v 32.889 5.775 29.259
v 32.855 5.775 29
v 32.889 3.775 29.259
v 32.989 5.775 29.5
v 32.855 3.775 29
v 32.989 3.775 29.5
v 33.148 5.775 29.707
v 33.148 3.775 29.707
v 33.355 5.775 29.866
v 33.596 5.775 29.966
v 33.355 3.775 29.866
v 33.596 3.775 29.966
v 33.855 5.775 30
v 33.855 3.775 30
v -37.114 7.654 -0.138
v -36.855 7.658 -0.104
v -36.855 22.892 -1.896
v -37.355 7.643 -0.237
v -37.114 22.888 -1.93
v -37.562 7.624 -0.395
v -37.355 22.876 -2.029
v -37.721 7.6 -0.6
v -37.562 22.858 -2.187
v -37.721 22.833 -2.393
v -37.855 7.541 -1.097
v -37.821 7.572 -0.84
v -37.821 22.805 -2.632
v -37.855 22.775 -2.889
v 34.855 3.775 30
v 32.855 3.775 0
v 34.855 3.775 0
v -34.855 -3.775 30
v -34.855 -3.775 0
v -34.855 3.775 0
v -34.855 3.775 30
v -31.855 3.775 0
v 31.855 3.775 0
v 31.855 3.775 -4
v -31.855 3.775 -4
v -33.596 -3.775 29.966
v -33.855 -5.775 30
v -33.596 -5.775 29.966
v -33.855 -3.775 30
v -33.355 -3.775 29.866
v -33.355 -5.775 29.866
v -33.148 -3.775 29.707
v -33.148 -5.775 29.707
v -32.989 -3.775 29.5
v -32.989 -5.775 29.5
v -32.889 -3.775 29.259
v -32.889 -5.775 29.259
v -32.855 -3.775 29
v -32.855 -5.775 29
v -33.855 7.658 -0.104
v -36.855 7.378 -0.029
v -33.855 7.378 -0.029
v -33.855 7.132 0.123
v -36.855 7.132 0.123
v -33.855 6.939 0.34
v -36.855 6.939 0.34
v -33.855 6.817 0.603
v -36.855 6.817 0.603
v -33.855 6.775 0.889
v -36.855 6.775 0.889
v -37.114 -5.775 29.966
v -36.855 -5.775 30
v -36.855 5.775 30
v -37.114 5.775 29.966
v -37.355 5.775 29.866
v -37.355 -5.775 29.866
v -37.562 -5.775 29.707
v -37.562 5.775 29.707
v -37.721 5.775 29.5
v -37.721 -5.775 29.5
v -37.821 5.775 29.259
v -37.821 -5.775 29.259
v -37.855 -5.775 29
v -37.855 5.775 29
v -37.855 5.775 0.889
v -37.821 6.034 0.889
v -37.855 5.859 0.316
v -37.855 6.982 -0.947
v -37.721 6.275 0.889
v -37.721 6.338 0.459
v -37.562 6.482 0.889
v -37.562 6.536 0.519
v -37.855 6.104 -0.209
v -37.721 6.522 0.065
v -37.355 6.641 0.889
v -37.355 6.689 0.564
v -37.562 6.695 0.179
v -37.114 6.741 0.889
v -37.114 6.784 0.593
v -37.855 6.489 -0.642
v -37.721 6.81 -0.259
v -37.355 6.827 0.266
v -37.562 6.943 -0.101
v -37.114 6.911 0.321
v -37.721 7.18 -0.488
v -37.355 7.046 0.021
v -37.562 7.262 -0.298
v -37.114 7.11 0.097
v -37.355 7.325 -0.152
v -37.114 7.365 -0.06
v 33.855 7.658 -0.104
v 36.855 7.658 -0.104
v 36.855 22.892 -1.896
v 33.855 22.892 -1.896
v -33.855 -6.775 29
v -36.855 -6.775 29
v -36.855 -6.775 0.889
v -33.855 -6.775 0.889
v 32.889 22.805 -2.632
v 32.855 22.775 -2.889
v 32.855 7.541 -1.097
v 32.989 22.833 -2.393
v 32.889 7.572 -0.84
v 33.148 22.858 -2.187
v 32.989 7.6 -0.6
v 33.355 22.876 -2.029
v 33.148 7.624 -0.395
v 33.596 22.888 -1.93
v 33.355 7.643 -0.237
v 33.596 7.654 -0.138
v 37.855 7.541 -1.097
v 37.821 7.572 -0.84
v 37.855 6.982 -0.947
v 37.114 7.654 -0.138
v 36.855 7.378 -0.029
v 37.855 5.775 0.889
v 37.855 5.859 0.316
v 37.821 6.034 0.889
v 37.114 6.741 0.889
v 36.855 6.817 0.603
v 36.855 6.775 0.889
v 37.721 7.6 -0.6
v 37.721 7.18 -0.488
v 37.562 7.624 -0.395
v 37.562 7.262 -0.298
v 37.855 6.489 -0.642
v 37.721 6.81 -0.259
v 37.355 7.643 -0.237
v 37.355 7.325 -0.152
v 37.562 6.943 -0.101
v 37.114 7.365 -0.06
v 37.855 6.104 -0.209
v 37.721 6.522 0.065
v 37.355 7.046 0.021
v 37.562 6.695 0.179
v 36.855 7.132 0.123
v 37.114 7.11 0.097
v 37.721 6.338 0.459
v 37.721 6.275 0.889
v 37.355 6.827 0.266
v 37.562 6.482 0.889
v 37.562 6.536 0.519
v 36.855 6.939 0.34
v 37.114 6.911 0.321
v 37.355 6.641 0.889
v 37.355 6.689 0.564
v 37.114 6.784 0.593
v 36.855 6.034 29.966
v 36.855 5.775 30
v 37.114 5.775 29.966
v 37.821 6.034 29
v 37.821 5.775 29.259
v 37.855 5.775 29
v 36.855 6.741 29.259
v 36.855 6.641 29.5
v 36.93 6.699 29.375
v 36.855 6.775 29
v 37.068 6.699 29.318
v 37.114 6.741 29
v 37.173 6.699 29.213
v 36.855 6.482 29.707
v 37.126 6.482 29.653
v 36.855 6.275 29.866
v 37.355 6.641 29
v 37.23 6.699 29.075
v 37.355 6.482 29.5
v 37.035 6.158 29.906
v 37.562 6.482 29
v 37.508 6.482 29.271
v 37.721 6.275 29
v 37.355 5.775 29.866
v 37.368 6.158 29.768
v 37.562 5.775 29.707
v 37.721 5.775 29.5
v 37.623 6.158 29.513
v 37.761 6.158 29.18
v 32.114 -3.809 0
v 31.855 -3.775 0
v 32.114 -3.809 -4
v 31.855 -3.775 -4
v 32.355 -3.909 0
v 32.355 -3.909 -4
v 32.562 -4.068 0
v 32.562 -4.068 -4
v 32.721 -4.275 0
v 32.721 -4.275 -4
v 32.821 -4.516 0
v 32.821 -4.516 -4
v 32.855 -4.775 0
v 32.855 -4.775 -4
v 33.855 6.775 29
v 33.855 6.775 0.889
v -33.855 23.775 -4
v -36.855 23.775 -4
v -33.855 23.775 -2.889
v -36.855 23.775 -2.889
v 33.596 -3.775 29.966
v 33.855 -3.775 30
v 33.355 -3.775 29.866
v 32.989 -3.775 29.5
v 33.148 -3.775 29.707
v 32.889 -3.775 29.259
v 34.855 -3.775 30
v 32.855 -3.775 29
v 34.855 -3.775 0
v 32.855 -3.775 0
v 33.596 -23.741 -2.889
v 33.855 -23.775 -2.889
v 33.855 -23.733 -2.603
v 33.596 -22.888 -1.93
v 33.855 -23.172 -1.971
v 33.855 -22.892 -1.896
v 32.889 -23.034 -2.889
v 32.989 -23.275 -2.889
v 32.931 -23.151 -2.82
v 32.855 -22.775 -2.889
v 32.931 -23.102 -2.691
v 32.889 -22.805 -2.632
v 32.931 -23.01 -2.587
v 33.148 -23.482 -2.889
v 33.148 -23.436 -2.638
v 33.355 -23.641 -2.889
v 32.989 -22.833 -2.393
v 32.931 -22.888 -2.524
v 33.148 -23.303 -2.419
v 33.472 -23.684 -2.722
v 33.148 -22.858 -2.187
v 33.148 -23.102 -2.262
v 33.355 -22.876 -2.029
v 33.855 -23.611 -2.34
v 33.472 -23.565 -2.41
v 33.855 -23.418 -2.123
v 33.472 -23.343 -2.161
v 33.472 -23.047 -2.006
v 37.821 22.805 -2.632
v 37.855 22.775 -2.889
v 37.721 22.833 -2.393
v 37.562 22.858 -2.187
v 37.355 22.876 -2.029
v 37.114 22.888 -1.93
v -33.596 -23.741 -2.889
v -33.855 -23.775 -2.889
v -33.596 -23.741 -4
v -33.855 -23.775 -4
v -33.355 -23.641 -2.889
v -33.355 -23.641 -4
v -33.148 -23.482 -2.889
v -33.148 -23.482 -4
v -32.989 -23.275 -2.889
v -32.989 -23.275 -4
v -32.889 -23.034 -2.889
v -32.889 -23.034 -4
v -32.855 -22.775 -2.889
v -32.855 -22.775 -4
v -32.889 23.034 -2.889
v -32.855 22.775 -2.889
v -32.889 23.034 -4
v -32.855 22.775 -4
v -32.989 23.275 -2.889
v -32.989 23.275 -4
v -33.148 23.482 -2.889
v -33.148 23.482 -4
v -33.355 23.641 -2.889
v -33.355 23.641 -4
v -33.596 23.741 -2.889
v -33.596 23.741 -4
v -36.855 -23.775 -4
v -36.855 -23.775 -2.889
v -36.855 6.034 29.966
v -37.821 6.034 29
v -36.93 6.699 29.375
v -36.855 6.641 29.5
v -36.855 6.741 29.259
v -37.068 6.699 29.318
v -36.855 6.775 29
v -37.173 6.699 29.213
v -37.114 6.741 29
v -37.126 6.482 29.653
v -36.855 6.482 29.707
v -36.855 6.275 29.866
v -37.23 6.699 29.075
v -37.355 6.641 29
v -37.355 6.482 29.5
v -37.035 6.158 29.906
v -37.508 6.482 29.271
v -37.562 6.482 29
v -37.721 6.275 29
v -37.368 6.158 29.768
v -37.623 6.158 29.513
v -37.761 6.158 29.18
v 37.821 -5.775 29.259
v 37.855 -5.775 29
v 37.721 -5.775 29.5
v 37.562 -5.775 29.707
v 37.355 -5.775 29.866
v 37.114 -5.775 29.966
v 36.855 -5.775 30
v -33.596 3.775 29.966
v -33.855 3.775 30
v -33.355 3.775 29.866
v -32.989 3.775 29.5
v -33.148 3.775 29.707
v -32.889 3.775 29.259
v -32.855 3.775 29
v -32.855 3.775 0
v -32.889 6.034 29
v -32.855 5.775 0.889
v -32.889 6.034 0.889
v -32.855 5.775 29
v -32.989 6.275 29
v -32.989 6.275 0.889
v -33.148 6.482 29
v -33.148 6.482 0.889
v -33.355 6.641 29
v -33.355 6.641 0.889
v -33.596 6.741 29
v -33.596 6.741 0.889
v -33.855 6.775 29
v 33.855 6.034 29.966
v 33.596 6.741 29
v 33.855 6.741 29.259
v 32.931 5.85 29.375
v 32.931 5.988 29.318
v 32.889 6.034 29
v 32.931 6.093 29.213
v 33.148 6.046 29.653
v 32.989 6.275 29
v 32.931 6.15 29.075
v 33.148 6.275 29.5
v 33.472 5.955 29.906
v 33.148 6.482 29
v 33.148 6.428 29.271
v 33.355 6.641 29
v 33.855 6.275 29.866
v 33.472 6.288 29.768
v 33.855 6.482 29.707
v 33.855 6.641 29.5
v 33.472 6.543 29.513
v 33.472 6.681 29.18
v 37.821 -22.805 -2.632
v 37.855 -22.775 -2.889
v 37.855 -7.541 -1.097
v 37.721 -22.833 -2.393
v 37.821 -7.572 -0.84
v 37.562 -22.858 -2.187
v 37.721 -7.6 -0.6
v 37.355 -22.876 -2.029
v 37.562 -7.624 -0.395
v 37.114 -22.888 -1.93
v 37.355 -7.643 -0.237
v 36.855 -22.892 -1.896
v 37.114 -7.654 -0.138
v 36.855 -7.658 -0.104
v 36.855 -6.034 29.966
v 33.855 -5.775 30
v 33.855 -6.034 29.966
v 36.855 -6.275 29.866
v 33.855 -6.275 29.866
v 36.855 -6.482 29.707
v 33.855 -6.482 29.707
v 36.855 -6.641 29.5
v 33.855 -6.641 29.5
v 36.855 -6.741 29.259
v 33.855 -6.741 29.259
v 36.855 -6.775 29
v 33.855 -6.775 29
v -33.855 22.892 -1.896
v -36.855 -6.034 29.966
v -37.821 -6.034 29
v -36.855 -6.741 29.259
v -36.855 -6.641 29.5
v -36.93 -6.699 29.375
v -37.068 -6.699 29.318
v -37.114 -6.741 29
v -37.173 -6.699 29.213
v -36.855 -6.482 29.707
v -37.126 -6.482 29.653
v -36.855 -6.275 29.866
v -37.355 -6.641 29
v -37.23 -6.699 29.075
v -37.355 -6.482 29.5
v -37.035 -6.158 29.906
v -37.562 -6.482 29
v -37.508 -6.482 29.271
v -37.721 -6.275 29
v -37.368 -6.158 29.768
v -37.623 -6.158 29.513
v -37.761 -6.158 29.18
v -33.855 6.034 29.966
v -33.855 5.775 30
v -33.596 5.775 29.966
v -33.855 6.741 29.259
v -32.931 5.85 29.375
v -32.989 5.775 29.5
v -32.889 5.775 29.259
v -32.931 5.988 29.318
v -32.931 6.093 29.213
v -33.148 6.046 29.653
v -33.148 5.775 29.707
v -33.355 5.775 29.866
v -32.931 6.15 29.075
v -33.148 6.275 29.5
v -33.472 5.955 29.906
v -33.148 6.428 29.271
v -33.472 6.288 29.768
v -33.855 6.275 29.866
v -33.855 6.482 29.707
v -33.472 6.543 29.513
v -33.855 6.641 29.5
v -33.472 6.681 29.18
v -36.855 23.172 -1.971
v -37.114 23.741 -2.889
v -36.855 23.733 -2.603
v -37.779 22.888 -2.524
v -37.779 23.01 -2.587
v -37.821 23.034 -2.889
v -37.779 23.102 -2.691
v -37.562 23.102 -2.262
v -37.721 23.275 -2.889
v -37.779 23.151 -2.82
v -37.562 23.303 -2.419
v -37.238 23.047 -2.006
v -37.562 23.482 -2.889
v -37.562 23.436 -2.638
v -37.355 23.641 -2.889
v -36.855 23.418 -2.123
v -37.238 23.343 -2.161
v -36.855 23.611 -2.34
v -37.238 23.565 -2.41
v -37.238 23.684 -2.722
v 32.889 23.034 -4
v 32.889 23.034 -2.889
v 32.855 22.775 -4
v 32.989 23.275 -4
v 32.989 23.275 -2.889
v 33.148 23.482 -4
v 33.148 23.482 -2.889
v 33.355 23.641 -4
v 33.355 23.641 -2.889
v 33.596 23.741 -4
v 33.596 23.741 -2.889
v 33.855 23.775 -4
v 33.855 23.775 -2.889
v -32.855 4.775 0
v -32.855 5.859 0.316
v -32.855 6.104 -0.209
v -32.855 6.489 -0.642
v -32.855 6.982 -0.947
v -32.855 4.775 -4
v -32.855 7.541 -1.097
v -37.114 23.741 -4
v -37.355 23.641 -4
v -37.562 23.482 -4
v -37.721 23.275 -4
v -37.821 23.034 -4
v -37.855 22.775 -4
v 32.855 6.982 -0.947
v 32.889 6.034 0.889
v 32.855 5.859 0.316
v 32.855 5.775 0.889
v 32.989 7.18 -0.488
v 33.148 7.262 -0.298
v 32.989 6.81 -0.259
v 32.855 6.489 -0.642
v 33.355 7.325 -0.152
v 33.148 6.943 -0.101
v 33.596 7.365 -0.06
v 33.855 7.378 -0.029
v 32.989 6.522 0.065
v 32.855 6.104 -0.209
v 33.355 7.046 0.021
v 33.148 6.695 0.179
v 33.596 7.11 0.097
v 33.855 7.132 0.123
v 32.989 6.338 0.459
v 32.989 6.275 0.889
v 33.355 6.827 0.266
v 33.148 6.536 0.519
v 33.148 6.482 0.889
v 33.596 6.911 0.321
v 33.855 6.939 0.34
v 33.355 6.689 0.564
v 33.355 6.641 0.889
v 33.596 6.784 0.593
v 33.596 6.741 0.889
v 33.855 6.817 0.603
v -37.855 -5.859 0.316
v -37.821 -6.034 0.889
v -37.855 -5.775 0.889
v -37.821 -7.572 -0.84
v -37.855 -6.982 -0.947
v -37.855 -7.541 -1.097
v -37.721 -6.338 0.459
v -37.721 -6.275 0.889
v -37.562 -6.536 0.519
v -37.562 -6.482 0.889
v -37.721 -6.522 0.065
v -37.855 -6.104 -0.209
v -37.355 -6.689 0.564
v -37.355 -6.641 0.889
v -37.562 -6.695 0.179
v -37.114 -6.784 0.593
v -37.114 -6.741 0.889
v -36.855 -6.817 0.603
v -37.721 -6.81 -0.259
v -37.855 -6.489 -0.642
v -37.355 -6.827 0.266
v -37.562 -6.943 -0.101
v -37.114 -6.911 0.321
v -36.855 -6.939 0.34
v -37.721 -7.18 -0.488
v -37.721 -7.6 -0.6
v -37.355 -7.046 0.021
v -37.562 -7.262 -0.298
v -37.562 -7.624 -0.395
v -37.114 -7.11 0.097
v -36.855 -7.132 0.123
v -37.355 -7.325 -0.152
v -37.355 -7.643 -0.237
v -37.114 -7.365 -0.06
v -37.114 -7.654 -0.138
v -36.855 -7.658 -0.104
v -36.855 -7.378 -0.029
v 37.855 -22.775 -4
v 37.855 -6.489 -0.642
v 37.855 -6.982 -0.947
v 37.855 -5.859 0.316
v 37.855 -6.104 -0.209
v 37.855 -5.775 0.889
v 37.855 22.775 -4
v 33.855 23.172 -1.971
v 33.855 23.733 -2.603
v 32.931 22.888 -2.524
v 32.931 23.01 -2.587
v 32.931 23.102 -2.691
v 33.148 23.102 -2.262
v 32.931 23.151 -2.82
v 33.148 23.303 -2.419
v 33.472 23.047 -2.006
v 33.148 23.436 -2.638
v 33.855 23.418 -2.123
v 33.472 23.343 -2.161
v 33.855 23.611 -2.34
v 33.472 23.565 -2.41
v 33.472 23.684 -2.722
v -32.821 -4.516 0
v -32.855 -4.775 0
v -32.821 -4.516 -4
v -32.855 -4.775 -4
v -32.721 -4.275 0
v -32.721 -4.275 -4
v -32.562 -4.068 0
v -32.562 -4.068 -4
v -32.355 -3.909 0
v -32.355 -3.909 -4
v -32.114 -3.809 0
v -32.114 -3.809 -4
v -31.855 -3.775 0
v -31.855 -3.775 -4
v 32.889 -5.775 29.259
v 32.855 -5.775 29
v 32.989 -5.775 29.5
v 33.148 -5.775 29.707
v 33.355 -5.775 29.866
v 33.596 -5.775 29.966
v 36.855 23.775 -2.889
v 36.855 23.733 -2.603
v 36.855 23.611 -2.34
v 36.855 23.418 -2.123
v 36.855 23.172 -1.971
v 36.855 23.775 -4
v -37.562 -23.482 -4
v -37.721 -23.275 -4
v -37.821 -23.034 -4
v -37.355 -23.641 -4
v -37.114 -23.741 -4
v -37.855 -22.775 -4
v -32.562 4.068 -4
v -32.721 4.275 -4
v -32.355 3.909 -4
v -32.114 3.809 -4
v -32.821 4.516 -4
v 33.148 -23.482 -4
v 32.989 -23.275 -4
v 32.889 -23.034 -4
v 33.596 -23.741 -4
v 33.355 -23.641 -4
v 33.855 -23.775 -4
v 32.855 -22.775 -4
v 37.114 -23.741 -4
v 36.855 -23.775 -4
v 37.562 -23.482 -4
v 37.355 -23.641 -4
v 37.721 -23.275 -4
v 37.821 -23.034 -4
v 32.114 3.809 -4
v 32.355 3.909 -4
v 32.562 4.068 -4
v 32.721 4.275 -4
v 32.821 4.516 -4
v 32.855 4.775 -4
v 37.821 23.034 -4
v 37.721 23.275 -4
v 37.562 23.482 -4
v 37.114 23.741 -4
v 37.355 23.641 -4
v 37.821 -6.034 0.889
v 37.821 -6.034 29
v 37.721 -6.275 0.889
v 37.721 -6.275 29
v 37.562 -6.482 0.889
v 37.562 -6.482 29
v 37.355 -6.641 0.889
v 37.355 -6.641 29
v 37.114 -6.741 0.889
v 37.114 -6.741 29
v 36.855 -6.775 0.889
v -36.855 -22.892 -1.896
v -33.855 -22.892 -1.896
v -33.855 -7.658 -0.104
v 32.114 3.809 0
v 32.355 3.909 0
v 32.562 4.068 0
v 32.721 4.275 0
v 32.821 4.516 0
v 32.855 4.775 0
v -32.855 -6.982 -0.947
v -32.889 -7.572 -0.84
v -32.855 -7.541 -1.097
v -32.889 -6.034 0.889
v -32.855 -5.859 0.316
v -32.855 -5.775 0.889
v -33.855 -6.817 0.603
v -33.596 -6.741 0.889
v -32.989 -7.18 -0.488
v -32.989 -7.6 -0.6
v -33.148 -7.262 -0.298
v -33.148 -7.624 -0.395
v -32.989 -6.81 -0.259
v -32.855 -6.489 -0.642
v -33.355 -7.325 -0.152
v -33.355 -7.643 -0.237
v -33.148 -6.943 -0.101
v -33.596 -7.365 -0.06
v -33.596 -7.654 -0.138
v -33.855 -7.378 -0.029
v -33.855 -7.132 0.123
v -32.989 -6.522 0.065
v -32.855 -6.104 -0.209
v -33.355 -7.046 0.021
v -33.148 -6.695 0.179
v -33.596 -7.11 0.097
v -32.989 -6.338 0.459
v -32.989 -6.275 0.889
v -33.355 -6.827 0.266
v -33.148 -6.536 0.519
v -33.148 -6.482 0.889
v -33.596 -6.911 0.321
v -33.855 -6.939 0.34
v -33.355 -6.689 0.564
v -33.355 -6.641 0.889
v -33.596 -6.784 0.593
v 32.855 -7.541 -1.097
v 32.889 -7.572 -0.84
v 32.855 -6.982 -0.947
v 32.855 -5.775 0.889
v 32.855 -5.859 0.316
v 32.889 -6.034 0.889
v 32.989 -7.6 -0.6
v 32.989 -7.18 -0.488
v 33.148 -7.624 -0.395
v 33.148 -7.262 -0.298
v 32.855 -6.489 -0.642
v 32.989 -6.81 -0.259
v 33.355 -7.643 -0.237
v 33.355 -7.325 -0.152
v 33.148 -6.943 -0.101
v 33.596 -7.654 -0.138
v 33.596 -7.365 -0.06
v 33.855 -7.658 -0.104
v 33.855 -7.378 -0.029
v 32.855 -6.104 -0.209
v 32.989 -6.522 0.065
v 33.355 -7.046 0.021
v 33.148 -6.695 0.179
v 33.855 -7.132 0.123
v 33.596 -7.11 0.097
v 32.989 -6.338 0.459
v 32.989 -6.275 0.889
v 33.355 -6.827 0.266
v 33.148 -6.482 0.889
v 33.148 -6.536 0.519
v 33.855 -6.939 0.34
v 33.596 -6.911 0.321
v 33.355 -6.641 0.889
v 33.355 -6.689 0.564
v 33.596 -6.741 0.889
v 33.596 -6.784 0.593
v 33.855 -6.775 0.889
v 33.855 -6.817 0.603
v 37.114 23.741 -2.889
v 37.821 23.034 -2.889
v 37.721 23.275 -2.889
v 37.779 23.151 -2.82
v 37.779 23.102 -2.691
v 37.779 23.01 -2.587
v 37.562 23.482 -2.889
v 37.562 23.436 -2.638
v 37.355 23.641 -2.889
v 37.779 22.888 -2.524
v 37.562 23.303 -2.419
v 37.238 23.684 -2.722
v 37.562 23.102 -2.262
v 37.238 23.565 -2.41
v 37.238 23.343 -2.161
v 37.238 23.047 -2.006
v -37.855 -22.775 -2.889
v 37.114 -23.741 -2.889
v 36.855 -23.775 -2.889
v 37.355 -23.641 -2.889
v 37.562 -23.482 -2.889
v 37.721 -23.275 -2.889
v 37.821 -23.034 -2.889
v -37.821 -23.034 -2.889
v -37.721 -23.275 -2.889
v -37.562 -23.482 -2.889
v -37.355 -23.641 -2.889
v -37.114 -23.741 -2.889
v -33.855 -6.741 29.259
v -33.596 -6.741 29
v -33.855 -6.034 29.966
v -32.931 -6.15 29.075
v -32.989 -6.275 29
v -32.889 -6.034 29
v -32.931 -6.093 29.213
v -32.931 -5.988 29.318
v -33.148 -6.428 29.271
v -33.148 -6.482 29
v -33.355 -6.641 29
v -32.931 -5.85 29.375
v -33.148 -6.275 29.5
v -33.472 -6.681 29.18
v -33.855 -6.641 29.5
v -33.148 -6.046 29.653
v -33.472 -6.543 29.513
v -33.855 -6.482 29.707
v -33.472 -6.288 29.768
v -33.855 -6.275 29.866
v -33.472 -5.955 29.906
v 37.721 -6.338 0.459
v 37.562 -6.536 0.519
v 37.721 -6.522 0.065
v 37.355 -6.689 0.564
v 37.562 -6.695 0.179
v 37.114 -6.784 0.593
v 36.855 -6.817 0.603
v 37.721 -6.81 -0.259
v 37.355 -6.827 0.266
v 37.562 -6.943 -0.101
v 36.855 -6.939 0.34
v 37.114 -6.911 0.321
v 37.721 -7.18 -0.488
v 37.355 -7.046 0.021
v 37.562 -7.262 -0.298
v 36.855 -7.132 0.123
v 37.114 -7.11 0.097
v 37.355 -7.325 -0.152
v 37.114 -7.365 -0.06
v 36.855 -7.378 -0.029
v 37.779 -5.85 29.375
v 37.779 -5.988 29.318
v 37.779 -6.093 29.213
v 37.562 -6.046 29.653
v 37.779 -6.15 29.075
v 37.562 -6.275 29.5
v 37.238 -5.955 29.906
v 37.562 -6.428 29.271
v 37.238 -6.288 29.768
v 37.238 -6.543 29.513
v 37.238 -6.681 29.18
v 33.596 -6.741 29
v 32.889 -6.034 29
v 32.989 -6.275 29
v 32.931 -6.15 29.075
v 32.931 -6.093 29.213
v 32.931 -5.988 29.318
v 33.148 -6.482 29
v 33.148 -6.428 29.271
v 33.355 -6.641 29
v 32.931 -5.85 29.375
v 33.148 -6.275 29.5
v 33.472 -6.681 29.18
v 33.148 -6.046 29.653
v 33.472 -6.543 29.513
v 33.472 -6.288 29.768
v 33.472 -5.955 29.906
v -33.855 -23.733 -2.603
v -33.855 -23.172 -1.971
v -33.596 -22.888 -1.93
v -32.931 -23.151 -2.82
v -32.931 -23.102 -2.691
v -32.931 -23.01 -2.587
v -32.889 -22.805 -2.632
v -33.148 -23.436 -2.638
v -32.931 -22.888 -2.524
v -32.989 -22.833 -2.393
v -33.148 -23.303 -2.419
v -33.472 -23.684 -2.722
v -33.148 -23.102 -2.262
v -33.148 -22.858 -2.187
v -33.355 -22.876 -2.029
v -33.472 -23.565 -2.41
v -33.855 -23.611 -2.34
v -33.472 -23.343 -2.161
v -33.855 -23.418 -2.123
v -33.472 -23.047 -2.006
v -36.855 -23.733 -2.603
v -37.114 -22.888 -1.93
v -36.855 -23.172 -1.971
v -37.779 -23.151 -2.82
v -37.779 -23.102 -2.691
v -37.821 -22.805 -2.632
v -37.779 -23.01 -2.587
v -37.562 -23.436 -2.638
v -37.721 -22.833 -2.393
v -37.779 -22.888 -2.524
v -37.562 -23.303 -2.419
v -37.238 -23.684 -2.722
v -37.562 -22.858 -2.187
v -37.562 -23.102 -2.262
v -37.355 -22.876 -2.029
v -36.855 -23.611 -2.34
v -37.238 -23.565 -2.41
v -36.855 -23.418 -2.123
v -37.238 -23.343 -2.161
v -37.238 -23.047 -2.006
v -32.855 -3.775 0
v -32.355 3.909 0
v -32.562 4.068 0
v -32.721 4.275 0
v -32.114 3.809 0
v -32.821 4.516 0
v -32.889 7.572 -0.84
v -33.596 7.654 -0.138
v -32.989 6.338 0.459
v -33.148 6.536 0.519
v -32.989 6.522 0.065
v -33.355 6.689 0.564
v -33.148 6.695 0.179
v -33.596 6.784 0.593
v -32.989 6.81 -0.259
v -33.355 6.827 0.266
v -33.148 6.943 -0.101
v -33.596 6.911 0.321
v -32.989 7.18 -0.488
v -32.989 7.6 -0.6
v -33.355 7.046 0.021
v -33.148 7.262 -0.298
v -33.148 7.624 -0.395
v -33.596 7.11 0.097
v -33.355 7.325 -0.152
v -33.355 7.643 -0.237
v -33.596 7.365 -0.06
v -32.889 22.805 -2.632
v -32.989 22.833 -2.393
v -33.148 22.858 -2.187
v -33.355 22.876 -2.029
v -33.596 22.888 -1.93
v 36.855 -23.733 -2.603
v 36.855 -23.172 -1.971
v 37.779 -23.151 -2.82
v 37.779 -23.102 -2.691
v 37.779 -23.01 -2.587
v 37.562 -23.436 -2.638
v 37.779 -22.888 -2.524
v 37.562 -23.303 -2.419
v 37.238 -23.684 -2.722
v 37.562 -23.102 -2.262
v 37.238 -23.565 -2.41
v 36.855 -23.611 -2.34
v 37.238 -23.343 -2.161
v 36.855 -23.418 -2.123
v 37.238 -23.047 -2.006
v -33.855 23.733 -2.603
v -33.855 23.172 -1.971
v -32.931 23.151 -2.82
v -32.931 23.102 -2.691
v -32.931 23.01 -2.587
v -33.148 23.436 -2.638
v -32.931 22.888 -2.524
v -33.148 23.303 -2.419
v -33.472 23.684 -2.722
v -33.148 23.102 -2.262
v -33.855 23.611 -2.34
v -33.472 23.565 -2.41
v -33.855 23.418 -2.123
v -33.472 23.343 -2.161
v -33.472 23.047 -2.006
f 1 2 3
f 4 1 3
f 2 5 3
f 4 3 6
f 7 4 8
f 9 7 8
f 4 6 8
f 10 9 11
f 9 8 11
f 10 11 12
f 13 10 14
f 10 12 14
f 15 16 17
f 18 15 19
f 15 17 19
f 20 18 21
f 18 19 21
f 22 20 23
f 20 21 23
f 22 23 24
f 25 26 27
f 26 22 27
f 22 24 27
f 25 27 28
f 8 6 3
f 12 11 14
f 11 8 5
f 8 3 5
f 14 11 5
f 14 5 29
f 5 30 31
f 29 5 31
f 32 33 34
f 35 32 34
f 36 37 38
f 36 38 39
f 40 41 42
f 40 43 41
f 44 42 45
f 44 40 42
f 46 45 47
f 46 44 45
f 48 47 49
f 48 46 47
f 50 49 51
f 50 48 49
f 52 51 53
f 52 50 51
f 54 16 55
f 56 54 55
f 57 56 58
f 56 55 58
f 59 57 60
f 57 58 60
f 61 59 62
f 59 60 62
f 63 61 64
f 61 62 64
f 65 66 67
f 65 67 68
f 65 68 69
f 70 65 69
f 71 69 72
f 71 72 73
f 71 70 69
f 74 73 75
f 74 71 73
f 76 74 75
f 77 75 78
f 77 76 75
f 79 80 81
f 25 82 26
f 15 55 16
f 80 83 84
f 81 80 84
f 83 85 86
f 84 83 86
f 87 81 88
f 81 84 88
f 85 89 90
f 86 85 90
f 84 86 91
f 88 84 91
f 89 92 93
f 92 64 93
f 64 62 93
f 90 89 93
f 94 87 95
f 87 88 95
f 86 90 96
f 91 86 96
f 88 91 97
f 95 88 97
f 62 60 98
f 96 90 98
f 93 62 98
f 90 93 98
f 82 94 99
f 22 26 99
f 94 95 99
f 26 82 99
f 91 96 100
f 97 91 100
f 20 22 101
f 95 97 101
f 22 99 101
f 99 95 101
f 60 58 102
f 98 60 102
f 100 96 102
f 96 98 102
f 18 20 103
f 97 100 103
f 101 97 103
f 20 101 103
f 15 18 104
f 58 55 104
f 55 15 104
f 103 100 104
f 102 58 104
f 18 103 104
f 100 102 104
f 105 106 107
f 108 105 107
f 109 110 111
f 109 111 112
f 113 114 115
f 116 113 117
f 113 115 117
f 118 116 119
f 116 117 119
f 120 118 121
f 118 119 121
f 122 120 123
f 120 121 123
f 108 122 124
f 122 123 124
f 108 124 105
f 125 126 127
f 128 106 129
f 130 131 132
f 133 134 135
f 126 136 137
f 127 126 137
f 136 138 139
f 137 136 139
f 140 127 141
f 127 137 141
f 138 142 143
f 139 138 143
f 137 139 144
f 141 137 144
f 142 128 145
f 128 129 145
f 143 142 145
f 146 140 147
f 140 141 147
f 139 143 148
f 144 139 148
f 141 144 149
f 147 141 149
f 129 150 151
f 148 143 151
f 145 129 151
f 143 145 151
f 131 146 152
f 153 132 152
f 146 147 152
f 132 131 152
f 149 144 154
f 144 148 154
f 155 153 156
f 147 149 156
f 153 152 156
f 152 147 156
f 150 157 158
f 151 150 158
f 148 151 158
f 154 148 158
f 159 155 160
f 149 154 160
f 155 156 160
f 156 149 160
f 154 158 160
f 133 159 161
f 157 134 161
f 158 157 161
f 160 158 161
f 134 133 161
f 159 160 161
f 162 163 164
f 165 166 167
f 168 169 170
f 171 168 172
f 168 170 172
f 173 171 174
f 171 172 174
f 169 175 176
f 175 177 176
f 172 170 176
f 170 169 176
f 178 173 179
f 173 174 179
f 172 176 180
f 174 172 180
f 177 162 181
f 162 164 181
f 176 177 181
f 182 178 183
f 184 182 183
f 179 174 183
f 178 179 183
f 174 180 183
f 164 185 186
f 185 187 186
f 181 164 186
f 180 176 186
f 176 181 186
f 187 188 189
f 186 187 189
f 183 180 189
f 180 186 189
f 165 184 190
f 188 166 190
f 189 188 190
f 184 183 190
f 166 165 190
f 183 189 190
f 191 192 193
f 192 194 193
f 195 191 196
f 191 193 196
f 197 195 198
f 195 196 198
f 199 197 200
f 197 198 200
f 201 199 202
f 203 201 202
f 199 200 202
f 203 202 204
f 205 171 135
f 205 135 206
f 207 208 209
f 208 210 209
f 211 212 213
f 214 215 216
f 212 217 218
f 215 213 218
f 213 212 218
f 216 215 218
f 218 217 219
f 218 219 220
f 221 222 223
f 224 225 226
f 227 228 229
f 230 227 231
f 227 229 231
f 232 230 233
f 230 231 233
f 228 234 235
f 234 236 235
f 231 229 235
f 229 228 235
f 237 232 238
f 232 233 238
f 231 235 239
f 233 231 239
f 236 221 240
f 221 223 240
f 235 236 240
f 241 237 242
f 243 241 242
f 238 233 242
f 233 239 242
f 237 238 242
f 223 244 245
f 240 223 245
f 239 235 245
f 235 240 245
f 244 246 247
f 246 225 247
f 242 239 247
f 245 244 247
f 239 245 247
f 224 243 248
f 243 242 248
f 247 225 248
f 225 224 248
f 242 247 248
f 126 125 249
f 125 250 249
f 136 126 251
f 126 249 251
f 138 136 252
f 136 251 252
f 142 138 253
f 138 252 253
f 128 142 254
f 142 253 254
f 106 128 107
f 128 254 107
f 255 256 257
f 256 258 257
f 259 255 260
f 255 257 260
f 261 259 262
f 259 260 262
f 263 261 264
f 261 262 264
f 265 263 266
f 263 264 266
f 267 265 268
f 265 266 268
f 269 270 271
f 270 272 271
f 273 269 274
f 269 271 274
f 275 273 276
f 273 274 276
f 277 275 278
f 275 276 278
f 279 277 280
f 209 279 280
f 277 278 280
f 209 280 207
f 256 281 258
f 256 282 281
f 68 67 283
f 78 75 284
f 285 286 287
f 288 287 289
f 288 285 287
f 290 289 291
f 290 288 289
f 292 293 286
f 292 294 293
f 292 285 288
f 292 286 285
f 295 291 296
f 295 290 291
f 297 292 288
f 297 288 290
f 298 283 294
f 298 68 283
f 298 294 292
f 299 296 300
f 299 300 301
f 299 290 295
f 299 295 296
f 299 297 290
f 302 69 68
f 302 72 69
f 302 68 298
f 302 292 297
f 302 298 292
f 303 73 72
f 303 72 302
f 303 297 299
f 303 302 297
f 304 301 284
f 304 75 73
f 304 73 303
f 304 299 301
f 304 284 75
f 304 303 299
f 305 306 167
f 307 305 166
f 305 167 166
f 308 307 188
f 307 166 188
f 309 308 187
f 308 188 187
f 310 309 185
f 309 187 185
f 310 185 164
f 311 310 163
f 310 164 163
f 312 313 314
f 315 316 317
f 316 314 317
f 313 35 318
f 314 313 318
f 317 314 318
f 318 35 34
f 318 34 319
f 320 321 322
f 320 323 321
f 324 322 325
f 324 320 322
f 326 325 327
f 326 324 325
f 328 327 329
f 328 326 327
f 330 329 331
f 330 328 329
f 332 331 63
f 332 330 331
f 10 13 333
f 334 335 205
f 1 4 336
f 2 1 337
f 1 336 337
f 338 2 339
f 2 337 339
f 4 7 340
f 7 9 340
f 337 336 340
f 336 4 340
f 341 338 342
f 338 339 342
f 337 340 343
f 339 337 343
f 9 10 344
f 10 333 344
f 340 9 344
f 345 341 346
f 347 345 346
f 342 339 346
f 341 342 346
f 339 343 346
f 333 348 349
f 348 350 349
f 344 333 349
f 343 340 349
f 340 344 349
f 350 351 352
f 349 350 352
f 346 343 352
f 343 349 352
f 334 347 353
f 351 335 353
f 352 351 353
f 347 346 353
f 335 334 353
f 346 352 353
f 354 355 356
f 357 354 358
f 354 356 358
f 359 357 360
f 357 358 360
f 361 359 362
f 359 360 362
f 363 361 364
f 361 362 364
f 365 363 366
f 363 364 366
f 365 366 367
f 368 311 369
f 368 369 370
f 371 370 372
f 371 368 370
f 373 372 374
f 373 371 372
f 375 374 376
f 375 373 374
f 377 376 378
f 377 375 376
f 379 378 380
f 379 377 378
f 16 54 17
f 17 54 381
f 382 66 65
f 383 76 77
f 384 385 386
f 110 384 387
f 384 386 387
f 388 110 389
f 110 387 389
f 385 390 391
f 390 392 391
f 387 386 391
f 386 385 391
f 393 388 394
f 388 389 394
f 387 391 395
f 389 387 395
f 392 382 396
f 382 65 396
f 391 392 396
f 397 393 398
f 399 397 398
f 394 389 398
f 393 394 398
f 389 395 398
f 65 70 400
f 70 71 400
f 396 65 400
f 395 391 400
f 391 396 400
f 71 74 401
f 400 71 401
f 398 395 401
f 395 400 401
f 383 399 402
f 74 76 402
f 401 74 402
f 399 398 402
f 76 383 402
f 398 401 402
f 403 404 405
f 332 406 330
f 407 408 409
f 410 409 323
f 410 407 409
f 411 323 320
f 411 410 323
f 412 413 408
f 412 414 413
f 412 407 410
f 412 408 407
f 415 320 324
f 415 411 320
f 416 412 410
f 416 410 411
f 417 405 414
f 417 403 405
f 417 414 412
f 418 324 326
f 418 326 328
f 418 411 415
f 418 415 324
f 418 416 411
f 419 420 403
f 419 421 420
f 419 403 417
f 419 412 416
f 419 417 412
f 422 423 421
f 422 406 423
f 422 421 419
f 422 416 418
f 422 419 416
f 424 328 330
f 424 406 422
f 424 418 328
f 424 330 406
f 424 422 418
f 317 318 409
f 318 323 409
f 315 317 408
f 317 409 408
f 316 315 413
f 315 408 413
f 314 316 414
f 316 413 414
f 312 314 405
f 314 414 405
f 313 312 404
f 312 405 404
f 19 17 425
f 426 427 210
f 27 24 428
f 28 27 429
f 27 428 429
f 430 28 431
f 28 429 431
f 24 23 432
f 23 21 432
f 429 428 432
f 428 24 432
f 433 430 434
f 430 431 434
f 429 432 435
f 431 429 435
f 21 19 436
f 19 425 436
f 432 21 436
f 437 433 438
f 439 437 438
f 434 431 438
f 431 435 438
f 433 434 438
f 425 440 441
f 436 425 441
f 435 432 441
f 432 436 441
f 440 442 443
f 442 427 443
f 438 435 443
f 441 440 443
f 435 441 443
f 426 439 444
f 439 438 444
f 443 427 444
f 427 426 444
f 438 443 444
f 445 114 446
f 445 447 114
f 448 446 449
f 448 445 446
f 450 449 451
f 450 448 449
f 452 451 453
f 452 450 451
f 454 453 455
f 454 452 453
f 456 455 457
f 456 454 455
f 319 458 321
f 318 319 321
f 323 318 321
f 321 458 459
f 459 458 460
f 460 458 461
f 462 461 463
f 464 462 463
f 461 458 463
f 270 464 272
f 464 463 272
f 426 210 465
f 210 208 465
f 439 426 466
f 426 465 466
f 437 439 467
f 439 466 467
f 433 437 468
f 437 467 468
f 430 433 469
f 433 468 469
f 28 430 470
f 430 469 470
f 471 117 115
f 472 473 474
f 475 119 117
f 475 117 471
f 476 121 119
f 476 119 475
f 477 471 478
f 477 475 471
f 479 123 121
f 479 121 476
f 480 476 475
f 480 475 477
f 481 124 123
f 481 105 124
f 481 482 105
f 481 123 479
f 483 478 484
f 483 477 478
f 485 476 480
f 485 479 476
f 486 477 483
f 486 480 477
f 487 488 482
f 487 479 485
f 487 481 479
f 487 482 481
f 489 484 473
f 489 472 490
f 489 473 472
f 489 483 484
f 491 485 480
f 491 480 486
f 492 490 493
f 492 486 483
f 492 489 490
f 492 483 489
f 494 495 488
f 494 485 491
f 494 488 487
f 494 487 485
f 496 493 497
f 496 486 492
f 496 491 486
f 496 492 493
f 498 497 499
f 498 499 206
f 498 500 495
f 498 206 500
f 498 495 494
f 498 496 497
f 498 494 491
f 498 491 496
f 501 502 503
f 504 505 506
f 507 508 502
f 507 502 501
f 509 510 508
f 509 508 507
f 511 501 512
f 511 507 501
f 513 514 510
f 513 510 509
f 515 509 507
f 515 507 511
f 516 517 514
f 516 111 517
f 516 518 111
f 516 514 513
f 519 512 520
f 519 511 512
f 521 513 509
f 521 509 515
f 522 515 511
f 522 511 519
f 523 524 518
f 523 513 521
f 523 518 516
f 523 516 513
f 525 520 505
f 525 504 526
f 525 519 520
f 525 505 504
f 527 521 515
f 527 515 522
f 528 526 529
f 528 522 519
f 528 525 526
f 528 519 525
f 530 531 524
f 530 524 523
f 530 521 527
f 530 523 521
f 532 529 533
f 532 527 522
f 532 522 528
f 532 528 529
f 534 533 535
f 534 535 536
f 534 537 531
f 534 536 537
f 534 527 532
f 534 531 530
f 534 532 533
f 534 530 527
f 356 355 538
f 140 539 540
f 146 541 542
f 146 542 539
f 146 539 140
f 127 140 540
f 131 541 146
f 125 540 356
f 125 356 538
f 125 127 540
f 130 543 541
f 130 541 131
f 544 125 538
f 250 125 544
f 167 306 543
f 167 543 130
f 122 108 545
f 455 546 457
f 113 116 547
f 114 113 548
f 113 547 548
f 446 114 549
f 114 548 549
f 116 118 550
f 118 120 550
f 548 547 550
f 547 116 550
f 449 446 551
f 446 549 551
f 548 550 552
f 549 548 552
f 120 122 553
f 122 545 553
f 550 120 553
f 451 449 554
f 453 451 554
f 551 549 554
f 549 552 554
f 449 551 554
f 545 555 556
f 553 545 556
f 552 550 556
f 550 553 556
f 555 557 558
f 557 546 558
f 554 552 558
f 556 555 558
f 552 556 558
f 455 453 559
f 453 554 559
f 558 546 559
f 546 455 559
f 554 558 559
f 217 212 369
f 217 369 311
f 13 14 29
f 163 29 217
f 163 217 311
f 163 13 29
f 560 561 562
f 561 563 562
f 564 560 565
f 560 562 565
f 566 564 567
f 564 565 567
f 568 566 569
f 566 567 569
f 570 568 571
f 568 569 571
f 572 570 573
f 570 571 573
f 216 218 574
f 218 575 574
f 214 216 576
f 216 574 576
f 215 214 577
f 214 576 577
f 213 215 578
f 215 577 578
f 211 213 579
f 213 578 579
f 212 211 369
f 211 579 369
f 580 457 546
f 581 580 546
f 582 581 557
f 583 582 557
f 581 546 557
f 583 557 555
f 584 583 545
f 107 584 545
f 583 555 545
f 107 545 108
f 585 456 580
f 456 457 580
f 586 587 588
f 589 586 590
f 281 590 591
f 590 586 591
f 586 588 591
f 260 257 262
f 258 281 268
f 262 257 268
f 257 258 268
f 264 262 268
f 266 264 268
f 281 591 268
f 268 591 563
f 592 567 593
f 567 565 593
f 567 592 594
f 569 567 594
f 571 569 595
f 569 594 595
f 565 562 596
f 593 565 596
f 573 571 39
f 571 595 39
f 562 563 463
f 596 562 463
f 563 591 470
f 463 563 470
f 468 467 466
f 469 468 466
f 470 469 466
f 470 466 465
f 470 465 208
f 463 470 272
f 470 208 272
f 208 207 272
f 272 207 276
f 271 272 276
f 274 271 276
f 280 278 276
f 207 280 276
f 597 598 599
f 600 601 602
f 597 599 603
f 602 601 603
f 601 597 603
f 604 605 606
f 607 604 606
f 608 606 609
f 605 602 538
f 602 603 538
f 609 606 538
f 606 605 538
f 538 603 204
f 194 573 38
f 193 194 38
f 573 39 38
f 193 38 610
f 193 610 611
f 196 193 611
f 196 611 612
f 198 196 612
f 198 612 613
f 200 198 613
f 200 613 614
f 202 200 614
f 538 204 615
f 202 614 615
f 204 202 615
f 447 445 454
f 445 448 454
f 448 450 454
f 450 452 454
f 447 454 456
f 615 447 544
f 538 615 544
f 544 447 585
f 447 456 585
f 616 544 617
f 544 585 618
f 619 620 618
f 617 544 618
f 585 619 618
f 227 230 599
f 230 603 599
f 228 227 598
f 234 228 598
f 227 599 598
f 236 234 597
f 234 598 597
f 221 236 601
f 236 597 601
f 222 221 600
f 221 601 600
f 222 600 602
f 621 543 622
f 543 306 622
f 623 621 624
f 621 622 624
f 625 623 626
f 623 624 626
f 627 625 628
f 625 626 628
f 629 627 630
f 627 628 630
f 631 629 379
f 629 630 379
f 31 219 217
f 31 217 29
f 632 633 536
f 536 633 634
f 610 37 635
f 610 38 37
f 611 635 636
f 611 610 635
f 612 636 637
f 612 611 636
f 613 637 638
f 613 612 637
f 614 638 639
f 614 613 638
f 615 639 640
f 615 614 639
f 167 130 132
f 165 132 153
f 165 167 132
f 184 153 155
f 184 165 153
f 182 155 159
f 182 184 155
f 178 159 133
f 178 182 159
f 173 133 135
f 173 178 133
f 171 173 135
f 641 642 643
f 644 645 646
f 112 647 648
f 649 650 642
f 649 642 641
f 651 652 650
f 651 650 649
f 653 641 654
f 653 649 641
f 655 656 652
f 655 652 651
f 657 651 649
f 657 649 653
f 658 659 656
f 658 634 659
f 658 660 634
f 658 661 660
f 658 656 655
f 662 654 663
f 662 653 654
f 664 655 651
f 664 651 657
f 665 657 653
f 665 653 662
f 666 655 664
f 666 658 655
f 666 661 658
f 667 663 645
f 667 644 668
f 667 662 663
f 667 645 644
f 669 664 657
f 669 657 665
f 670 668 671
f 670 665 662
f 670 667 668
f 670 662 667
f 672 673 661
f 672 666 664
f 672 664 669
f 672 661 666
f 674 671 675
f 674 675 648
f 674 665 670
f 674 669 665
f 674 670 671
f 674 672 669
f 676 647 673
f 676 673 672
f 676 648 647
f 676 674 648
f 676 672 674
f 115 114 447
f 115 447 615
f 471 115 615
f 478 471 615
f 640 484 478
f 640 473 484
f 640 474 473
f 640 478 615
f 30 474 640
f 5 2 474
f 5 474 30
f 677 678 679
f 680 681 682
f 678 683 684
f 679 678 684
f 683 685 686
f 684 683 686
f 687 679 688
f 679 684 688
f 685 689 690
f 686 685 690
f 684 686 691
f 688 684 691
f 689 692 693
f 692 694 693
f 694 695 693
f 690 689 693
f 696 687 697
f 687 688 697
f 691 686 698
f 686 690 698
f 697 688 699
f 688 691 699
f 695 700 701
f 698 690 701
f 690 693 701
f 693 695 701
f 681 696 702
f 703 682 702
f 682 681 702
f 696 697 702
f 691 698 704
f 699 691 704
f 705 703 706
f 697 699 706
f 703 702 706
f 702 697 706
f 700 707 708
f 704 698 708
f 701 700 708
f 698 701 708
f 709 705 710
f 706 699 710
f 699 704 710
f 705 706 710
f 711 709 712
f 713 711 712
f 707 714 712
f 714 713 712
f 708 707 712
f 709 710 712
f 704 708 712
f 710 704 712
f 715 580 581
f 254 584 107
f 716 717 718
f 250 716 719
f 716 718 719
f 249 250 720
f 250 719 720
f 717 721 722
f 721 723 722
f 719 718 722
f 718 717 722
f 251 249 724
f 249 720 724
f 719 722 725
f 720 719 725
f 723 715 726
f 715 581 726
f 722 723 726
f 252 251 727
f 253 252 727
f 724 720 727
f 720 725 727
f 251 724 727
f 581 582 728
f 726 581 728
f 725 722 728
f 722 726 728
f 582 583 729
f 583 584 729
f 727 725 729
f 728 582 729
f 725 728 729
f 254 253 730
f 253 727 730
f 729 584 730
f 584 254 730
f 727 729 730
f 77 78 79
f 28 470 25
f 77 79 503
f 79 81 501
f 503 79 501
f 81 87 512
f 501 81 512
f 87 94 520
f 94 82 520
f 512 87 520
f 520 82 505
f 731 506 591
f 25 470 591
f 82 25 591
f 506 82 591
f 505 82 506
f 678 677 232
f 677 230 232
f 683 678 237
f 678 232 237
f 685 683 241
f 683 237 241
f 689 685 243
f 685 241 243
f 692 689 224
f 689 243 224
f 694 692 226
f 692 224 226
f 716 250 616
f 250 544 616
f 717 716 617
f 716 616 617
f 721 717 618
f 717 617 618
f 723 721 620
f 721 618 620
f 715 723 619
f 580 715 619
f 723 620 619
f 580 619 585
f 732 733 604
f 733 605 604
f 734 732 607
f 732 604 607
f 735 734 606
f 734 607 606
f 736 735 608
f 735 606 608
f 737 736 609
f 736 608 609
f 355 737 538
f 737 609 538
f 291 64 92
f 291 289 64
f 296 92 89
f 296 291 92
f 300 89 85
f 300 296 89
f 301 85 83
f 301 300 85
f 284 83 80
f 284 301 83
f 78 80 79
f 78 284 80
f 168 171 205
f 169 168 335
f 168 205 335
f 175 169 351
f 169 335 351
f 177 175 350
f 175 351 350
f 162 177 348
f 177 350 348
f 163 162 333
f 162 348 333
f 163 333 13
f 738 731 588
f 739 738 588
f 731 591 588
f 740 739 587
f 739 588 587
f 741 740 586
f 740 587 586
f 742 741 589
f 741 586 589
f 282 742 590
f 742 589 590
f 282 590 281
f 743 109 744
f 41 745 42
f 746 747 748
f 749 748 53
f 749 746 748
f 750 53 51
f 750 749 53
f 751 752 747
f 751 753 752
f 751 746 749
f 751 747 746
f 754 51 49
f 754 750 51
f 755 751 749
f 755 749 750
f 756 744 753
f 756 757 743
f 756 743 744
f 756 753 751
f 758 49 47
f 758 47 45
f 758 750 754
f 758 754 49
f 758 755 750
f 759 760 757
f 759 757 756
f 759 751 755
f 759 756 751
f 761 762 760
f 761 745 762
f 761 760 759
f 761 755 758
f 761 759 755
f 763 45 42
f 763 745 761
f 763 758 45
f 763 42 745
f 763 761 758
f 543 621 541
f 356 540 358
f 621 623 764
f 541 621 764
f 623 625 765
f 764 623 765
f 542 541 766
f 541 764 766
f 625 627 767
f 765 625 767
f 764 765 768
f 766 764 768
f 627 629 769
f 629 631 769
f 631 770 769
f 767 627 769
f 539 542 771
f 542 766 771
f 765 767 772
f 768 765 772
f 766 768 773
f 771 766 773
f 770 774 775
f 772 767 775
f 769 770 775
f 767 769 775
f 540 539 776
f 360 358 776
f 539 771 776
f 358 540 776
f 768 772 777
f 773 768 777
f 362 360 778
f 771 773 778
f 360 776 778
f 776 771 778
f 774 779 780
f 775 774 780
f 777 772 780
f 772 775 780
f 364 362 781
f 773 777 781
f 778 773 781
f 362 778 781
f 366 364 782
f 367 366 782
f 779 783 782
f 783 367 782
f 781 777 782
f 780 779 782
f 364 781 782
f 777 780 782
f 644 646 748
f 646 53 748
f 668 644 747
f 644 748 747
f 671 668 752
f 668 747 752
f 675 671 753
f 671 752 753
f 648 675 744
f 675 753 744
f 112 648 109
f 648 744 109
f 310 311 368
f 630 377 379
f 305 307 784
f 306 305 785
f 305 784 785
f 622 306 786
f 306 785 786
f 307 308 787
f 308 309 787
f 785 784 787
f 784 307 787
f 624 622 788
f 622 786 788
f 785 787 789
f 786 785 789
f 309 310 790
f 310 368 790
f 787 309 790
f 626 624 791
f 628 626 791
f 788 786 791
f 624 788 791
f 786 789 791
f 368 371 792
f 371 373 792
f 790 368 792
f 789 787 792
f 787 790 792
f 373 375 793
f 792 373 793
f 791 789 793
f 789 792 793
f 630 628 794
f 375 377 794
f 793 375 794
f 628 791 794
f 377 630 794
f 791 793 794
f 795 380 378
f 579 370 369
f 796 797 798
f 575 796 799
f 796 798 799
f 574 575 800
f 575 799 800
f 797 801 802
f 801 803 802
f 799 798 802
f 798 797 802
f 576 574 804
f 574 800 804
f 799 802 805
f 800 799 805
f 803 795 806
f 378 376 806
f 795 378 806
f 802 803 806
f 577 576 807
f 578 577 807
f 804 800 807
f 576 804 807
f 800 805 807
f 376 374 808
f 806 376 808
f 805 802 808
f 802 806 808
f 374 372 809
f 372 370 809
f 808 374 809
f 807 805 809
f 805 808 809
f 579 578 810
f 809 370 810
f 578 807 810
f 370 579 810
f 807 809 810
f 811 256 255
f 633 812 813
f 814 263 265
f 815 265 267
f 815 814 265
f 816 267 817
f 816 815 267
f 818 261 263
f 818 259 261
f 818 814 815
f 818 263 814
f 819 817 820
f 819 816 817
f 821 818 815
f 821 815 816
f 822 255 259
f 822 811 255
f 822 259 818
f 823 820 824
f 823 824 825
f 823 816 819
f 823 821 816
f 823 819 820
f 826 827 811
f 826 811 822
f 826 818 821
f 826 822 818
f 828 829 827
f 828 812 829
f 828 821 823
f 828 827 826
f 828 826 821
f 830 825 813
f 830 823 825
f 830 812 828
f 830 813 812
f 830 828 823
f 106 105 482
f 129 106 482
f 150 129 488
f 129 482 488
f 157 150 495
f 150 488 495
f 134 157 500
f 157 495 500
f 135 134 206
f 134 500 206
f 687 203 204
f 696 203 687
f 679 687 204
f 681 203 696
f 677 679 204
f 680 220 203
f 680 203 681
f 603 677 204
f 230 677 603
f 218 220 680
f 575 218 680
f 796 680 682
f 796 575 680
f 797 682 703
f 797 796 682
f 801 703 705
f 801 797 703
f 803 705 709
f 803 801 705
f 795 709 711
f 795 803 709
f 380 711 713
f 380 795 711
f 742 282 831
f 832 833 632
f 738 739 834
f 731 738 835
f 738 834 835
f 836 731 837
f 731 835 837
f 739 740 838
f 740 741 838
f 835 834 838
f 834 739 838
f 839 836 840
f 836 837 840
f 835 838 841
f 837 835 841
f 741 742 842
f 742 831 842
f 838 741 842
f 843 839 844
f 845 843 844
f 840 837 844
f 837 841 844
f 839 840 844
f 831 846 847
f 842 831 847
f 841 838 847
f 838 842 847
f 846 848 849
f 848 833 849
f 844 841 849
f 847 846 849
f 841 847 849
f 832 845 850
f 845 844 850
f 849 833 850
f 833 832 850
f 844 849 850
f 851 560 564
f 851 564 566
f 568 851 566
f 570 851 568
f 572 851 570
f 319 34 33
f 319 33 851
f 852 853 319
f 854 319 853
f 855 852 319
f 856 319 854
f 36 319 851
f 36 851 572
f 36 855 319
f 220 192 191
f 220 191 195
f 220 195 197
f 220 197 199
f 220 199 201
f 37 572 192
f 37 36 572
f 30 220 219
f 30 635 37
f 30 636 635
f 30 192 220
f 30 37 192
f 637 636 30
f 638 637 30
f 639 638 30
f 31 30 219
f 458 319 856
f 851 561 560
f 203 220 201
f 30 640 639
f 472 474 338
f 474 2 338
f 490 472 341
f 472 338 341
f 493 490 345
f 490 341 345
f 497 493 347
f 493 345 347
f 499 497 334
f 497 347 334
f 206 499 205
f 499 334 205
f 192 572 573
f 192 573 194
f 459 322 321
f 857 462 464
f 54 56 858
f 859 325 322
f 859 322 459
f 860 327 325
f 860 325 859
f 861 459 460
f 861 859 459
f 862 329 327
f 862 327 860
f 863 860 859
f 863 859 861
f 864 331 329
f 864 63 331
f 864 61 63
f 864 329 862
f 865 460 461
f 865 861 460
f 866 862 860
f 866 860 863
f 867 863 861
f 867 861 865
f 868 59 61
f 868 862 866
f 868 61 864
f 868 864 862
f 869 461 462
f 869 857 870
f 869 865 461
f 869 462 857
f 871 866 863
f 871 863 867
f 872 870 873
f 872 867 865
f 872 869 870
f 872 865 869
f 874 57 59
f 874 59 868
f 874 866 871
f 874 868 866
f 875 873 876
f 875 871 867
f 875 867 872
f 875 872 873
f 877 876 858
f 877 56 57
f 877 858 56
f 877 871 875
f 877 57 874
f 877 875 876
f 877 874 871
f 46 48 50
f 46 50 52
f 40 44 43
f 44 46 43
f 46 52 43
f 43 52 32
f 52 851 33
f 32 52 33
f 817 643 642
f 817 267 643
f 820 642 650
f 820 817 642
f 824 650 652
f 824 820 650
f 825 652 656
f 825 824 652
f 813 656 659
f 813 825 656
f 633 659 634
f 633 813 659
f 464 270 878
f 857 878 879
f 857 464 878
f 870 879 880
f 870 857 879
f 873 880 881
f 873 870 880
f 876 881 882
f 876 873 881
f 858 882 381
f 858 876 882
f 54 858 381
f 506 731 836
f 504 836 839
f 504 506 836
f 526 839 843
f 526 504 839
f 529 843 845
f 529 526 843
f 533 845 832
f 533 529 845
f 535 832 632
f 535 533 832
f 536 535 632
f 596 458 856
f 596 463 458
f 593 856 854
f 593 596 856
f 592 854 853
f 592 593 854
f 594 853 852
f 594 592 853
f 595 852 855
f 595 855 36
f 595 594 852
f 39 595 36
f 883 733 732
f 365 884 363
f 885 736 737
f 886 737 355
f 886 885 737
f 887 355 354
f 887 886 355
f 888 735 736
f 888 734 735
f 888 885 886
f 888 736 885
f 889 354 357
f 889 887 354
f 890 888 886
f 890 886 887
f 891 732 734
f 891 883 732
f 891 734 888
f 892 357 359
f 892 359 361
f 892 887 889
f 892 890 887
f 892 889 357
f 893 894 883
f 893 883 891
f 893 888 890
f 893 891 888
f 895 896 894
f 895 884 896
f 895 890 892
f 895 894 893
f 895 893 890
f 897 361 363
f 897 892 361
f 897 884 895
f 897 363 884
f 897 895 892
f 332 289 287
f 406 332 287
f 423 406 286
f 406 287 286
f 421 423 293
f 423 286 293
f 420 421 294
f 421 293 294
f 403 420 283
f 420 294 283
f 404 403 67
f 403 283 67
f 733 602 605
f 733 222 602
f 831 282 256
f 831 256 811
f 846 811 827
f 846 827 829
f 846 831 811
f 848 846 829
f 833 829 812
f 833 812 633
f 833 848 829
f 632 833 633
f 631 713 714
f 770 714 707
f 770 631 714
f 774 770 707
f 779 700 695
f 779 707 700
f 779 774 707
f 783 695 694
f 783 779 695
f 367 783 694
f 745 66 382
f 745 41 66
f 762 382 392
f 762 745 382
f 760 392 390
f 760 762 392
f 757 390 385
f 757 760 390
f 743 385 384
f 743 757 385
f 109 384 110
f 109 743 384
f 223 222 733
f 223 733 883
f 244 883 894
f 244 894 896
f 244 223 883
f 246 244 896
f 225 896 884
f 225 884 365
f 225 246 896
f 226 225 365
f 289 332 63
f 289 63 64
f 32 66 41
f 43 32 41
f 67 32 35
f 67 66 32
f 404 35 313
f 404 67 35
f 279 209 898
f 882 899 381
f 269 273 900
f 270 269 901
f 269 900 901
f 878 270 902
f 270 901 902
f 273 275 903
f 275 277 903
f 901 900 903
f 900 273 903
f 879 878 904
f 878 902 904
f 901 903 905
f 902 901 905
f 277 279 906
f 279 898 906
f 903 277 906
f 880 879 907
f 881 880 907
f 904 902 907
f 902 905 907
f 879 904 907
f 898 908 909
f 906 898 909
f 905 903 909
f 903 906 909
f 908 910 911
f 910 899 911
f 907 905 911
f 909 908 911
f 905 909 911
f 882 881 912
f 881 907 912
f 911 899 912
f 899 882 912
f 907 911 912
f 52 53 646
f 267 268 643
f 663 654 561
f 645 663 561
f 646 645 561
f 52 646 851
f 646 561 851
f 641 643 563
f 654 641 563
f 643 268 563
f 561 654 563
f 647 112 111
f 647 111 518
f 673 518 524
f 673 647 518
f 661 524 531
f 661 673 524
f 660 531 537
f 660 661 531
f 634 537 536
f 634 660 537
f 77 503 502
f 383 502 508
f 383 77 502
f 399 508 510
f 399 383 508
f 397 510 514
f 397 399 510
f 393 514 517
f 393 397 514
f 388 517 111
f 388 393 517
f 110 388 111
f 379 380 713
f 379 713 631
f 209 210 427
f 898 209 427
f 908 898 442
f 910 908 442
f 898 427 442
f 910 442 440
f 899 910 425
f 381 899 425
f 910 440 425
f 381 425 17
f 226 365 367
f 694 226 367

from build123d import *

# Parameters (mm, degrees)
F0_W     = 5
F0_H     = 17
F0_W_2   = 3
F0_H_2   = 7.55
F1_DEPTH = 4
F2_DEPTH = 30
F4_DEPTH = 75.711
F5_R     = 1


with BuildPart() as f1:
    # F0 (on Top) → F1 (new body)
    with BuildSketch(Plane.XY):
        with Locations((-35.355, 15.275)):
            Rectangle(F0_W, F0_H)
        Polygon((-34.855, 3.775), (-32.855, 3.775), (-32.855, 6.775), (-37.855, 6.775), (-37.855, 3.775), align=None)
        with Locations((-35.355, -15.275)):
            Rectangle(F0_W, F0_H)
        Polygon((37.855, -3.775), (34.855, -3.775), (32.855, -3.775), (32.855, -6.775), (37.855, -6.775), align=None)
        with Locations((35.355, 15.275)):
            Rectangle(F0_W, F0_H)
        with Locations((-36.355, 0)):
            Rectangle(F0_W_2, F0_H_2)
        Polygon((-32.855, -6.775), (-32.855, -3.775), (-34.855, -3.775), (-37.855, -3.775), (-37.855, -6.775), align=None)
        Polygon((32.855, -3.775), (34.855, -3.775), (34.855, 3.775), (32.855, 3.775), (-32.855, 3.775), (-34.855, 3.775), (-34.855, -3.775), (-32.855, -3.775), align=None)
        with Locations((36.355, 0)):
            Rectangle(F0_W_2, F0_H_2)
        Polygon((32.855, 3.775), (34.855, 3.775), (37.855, 3.775), (37.855, 6.775), (32.855, 6.775), align=None)
        with Locations((35.355, -15.275)):
            Rectangle(F0_W, F0_H)
    extrude(amount=-F1_DEPTH)

    # F0 (on Top) → F2 (join)
    with BuildSketch(Plane.XY):
        Polygon((-34.855, 3.775), (-32.855, 3.775), (-32.855, 6.775), (-37.855, 6.775), (-37.855, 3.775), align=None)
        with Locations((-36.355, 0)):
            Rectangle(F0_W_2, F0_H_2)
        Polygon((-32.855, -6.775), (-32.855, -3.775), (-34.855, -3.775), (-37.855, -3.775), (-37.855, -6.775), align=None)
        Polygon((32.855, 3.775), (34.855, 3.775), (37.855, 3.775), (37.855, 6.775), (32.855, 6.775), align=None)
        with Locations((36.355, 0)):
            Rectangle(F0_W_2, F0_H_2)
        Polygon((37.855, -3.775), (34.855, -3.775), (32.855, -3.775), (32.855, -6.775), (37.855, -6.775), align=None)
    extrude(amount=F2_DEPTH)

    # F3 (on face) → F4 (cut, through all)
    with BuildSketch(Plane.YZ.offset(37.855)):
        Polygon((-23.775, -2), (-6.775, 0), (-23.775, 0), align=None)
        Polygon((23.775, 0), (6.775, 0), (23.775, -2), align=None)
    extrude(amount=-F4_DEPTH, mode=Mode.SUBTRACT)

    # F5
    f5_edges = [f1.edges().sort_by_distance(p)[0] for p in [
        (-37.855, 0, 30),
        (-35.355, -6.775, 30),
        (-37.855, -6.775, 15),
        (35.355, -6.775, 30),
        (37.855, 0, 30),
        (37.855, -6.775, 15),
        (37.855, -15.275, -1),
        (35.355, -23.775, -2),
        (37.855, -23.775, -3),
        (32.855, -23.775, -3),
        (32.855, -15.275, -1),
        (32.855, -6.775, 15),
        (-35.355, -23.775, -2),
        (-37.855, -23.775, -3),
        (-32.855, -23.775, -3),
        (-37.855, -15.275, -1),
        (-32.855, -15.275, -1),
        (-32.855, -6.775, 15),
        (-32.855, -5.275, 30),
        (32.855, -5.275, 30),
        (35.355, 6.775, 30),
        (37.855, 6.775, 15),
        (35.355, -6.775, 0),
        (-35.355, -6.775, 0),
        (35.355, 6.775, 0),
        (37.855, 15.275, -1),
        (35.355, 23.775, -2),
        (32.855, 15.275, -1),
        (37.855, 23.775, -3),
        (32.855, 23.775, -3),
        (-32.855, 15.275, -1),
        (-35.355, 23.775, -2),
        (-37.855, 15.275, -1),
        (-35.355, 6.775, 0),
        (-35.355, 6.775, 30),
        (-32.855, 5.275, 30),
        (-32.855, 23.775, -3),
        (-37.855, 23.775, -3),
        (-32.855, -3.775, -2),
        (32.855, -3.775, -2),
        (-32.855, 3.775, -2),
        (32.855, 3.775, -2),
        (32.855, 5.275, 30),
        (-37.855, 6.775, 15),
        (-32.855, 6.775, 15),
        (32.855, 6.775, 15),
    ]]
    fillet(f5_edges, radius=F5_R)


solid = f1.part
